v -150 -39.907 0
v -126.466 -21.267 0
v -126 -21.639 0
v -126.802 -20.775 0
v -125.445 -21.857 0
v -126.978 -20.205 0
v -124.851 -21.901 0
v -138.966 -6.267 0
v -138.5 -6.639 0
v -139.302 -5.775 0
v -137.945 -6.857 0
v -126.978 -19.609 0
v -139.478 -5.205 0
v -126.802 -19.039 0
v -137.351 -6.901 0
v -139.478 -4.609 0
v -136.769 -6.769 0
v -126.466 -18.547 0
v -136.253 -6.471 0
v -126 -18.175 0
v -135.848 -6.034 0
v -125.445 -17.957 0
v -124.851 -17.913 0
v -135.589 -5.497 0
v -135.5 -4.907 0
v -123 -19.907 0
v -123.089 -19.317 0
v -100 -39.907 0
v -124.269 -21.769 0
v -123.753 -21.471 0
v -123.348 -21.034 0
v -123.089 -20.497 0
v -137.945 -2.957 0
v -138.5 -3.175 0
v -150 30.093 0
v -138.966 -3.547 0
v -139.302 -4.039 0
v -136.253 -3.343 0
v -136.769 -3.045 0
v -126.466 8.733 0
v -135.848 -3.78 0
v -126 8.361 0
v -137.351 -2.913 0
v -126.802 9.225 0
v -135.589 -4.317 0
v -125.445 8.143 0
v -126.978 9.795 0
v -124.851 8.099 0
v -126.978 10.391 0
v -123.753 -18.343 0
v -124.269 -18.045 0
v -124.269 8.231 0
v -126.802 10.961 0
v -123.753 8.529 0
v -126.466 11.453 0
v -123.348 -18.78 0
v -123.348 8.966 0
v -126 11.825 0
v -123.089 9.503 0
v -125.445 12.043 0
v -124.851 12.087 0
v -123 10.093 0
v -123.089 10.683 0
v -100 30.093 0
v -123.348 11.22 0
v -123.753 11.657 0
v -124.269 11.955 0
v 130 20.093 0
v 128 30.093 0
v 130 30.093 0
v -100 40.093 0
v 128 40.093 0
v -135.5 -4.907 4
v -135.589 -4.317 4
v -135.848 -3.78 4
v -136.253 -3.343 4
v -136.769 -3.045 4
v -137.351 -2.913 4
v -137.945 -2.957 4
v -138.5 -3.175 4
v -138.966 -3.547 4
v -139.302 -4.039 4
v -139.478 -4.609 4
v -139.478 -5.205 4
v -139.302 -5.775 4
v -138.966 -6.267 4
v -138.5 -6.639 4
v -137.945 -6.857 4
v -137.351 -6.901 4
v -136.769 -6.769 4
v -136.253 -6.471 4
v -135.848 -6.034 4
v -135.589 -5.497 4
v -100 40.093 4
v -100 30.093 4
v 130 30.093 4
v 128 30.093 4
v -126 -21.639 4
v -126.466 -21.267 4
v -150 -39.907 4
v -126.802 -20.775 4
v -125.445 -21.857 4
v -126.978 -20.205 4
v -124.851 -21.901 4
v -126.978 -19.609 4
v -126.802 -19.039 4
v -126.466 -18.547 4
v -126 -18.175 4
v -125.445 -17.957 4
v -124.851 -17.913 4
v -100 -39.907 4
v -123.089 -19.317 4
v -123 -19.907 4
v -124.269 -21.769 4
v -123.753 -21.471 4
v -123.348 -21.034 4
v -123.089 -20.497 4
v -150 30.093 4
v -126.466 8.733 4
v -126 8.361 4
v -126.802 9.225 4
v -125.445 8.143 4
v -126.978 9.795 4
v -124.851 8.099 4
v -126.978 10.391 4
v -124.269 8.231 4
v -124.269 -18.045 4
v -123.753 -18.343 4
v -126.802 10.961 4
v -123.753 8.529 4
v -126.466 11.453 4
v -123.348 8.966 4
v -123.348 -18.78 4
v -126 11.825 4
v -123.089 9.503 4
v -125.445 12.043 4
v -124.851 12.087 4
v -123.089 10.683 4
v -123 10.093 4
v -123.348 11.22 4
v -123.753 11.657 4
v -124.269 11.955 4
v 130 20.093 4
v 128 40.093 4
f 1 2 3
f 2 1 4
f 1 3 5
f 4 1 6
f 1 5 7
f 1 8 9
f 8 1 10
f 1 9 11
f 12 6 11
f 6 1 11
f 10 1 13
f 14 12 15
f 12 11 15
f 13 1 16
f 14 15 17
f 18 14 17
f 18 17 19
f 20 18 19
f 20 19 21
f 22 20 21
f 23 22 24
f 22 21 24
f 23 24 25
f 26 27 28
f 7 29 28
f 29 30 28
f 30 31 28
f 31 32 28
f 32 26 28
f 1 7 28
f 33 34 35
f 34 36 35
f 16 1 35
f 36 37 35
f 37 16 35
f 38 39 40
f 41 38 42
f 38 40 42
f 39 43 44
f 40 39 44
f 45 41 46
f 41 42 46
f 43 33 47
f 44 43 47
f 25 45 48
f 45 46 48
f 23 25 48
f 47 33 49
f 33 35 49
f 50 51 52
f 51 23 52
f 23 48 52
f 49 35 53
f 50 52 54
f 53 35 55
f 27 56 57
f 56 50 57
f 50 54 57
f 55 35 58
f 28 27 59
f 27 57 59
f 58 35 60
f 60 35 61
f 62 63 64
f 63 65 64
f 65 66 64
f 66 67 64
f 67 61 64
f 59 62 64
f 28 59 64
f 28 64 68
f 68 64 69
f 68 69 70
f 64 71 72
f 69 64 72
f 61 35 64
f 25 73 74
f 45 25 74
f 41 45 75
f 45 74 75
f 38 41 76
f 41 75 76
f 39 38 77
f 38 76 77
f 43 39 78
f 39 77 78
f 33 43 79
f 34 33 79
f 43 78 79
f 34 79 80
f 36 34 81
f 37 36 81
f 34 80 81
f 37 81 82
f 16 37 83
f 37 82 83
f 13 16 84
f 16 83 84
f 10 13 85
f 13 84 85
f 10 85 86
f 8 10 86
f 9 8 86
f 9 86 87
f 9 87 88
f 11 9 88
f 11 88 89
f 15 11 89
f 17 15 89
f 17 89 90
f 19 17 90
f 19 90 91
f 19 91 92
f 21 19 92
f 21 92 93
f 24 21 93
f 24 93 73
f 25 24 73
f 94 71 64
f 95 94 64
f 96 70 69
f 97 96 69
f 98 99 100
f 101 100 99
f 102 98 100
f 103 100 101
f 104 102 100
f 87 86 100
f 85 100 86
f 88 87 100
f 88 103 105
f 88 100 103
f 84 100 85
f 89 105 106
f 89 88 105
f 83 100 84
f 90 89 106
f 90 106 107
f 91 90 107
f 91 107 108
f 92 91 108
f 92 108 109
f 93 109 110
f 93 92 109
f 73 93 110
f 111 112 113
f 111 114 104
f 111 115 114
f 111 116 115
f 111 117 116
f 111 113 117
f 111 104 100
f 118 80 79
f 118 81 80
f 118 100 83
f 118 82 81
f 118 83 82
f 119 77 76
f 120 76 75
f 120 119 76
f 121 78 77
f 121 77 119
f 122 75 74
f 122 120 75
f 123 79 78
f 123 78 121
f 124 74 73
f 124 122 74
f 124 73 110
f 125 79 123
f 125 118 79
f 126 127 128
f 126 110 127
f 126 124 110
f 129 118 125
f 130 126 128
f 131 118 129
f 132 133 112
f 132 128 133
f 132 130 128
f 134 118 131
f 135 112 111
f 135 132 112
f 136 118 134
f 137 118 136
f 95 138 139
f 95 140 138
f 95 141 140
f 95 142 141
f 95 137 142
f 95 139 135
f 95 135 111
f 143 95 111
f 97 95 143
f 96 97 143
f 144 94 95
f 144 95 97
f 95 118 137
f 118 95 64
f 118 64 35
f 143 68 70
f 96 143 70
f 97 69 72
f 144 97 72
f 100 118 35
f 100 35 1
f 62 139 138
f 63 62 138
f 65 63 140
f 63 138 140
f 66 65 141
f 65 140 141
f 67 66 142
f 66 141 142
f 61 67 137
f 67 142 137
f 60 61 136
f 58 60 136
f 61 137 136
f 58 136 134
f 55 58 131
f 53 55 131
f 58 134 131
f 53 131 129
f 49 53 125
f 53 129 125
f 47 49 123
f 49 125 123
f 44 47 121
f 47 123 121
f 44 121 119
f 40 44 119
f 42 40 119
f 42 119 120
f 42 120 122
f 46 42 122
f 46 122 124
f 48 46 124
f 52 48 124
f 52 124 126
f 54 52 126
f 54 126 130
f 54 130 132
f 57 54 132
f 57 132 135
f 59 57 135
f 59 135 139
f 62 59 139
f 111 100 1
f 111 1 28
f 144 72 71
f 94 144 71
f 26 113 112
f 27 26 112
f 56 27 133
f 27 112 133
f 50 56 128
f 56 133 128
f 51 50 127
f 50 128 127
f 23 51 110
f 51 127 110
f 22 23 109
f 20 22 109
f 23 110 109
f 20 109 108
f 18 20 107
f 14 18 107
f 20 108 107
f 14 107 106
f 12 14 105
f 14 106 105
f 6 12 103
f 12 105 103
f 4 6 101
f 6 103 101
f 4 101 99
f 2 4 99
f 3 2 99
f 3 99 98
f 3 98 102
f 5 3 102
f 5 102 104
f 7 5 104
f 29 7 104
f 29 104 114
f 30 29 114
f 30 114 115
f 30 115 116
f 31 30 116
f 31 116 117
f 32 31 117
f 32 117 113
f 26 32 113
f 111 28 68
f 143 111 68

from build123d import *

# Parameters (mm, degrees)
BOSS_EXTRUDE1_DEPTH = 4
BOSS_EXTRUDE2_DEPTH = 4
CUT_EXTRUDE1_REACH  = 6
SKETCH3_R           = 2


with BuildPart() as part:
    # Sketch1 → Boss-Extrude1 (new body)
    with BuildSketch(Plane.XY):
        Polygon((128, 30.092990436), (128, 40.092990436), (-100, 40.092990436), (-100, 20.092990436), (-130, 20.092990436), (-130, -39.907009564), (-100, -39.907009564), (130, 20.092990436), (130, 30.092990436), align=None)
    extrude(amount=BOSS_EXTRUDE1_DEPTH)

    # Sketch2 → Boss-Extrude2 (add)
    with BuildSketch(Plane.XY.offset(4)):
        Polygon((-100, 30.092990436), (-150, 30.092990436), (-150, -39.907009564), (-130, -39.907009564), (-130, 20.092990436), (-100, 20.092990436), align=None)
    extrude(amount=-BOSS_EXTRUDE2_DEPTH)

    # Sketch3 → Cut-Extrude1 (cut, up to next)
    with BuildSketch(Plane.XY.offset(4), mode=Mode.PRIVATE) as cut_extrude1_sk1:
        with Locations((-125, 10.092990436)):
            Circle(SKETCH3_R)
    cut_extrude1_tool1 = extrude(cut_extrude1_sk1.sketch, amount=-CUT_EXTRUDE1_REACH, mode=Mode.PRIVATE) & part.part
    add(cut_extrude1_tool1.solids().sort_by_distance((-125, 10.09299, 4))[0], mode=Mode.SUBTRACT)
    # Sketch3 → Cut-Extrude1 (cut, up to next)
    with BuildSketch(Plane.XY.offset(4), mode=Mode.PRIVATE) as cut_extrude1_sk2:
        with Locations((-125, -19.907009564)):
            Circle(SKETCH3_R)
    cut_extrude1_tool2 = extrude(cut_extrude1_sk2.sketch, amount=-CUT_EXTRUDE1_REACH, mode=Mode.PRIVATE) & part.part
    add(cut_extrude1_tool2.solids().sort_by_distance((-125, -19.90701, 4))[0], mode=Mode.SUBTRACT)
    # Sketch3 → Cut-Extrude1 (cut, up to next)
    with BuildSketch(Plane.XY.offset(4), mode=Mode.PRIVATE) as cut_extrude1_sk3:
        with Locations((-137.5, -4.907009564)):
            Circle(SKETCH3_R)
    cut_extrude1_tool3 = extrude(cut_extrude1_sk3.sketch, amount=-CUT_EXTRUDE1_REACH, mode=Mode.PRIVATE) & part.part
    add(cut_extrude1_tool3.solids().sort_by_distance((-137.5, -4.90701, 4))[0], mode=Mode.SUBTRACT)


solid = part.part
